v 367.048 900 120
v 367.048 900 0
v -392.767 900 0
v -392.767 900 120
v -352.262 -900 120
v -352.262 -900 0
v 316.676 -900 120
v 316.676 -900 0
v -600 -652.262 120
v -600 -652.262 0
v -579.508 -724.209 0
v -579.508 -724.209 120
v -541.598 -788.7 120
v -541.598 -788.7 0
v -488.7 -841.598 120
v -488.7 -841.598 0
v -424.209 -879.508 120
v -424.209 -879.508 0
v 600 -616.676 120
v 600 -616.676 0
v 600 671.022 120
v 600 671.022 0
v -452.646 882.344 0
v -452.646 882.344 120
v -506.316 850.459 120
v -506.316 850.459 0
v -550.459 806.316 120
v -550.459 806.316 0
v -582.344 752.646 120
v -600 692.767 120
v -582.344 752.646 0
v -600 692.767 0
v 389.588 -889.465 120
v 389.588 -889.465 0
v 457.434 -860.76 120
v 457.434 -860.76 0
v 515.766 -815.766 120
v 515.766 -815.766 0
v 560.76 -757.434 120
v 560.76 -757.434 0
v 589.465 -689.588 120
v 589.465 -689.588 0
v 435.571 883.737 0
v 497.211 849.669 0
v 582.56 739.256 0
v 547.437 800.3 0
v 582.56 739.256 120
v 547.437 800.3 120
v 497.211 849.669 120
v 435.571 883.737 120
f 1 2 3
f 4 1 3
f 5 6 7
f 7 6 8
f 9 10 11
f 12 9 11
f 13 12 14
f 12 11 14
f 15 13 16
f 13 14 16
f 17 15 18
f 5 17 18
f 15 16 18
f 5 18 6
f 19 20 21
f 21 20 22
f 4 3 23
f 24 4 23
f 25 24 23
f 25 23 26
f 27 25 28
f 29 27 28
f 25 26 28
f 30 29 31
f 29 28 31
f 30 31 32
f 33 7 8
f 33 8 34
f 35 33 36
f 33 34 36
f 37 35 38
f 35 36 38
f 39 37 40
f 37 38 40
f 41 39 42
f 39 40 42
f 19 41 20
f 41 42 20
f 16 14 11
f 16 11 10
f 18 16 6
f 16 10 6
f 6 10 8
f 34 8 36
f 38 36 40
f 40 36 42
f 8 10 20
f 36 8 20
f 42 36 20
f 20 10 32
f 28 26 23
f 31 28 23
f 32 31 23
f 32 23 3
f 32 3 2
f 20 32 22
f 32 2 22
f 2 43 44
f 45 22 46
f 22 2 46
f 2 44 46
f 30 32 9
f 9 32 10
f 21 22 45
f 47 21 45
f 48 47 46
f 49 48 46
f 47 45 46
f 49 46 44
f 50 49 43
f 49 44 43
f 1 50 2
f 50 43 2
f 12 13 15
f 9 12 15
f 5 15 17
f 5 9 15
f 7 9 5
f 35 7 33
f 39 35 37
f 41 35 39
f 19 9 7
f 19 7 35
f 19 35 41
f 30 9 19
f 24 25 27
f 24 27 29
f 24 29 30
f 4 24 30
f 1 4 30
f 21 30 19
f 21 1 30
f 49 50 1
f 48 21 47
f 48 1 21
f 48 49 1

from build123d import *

# Parameters (mm, degrees)
BOSS_EXTRUDE1_DEPTH = 120


with BuildPart() as part:
    # Sketch3 → Boss-Extrude1 (new body)
    with BuildSketch(Plane.XY):
        with BuildLine():
            Line((367.047667182, 900), (-392.766729868, 900))
            ThreePointArc((-392.766729868, 900), (-529.765209749, 829.765209749), (-600, 692.766729868))
            Line((-600, 692.766729868), (-600, -652.262218358))
            ThreePointArc((-600, -652.262218358), (-516.83040869, -816.83040869), (-352.262218358, -900))
            Line((-352.262218358, -900), (316.675693069, -900))
            ThreePointArc((316.675693069, -900), (515.76634783, -815.76634783), (600, -616.675693069))
            Line((600, -616.675693069), (600, -607.982402727))
            Line((600, -607.982402727), (600, 671.022296826))
            ThreePointArc((600, 671.022296826), (524.004104789, 826.694082288), (367.047667182, 900))
        make_face()
    extrude(amount=BOSS_EXTRUDE1_DEPTH)


solid = part.part
